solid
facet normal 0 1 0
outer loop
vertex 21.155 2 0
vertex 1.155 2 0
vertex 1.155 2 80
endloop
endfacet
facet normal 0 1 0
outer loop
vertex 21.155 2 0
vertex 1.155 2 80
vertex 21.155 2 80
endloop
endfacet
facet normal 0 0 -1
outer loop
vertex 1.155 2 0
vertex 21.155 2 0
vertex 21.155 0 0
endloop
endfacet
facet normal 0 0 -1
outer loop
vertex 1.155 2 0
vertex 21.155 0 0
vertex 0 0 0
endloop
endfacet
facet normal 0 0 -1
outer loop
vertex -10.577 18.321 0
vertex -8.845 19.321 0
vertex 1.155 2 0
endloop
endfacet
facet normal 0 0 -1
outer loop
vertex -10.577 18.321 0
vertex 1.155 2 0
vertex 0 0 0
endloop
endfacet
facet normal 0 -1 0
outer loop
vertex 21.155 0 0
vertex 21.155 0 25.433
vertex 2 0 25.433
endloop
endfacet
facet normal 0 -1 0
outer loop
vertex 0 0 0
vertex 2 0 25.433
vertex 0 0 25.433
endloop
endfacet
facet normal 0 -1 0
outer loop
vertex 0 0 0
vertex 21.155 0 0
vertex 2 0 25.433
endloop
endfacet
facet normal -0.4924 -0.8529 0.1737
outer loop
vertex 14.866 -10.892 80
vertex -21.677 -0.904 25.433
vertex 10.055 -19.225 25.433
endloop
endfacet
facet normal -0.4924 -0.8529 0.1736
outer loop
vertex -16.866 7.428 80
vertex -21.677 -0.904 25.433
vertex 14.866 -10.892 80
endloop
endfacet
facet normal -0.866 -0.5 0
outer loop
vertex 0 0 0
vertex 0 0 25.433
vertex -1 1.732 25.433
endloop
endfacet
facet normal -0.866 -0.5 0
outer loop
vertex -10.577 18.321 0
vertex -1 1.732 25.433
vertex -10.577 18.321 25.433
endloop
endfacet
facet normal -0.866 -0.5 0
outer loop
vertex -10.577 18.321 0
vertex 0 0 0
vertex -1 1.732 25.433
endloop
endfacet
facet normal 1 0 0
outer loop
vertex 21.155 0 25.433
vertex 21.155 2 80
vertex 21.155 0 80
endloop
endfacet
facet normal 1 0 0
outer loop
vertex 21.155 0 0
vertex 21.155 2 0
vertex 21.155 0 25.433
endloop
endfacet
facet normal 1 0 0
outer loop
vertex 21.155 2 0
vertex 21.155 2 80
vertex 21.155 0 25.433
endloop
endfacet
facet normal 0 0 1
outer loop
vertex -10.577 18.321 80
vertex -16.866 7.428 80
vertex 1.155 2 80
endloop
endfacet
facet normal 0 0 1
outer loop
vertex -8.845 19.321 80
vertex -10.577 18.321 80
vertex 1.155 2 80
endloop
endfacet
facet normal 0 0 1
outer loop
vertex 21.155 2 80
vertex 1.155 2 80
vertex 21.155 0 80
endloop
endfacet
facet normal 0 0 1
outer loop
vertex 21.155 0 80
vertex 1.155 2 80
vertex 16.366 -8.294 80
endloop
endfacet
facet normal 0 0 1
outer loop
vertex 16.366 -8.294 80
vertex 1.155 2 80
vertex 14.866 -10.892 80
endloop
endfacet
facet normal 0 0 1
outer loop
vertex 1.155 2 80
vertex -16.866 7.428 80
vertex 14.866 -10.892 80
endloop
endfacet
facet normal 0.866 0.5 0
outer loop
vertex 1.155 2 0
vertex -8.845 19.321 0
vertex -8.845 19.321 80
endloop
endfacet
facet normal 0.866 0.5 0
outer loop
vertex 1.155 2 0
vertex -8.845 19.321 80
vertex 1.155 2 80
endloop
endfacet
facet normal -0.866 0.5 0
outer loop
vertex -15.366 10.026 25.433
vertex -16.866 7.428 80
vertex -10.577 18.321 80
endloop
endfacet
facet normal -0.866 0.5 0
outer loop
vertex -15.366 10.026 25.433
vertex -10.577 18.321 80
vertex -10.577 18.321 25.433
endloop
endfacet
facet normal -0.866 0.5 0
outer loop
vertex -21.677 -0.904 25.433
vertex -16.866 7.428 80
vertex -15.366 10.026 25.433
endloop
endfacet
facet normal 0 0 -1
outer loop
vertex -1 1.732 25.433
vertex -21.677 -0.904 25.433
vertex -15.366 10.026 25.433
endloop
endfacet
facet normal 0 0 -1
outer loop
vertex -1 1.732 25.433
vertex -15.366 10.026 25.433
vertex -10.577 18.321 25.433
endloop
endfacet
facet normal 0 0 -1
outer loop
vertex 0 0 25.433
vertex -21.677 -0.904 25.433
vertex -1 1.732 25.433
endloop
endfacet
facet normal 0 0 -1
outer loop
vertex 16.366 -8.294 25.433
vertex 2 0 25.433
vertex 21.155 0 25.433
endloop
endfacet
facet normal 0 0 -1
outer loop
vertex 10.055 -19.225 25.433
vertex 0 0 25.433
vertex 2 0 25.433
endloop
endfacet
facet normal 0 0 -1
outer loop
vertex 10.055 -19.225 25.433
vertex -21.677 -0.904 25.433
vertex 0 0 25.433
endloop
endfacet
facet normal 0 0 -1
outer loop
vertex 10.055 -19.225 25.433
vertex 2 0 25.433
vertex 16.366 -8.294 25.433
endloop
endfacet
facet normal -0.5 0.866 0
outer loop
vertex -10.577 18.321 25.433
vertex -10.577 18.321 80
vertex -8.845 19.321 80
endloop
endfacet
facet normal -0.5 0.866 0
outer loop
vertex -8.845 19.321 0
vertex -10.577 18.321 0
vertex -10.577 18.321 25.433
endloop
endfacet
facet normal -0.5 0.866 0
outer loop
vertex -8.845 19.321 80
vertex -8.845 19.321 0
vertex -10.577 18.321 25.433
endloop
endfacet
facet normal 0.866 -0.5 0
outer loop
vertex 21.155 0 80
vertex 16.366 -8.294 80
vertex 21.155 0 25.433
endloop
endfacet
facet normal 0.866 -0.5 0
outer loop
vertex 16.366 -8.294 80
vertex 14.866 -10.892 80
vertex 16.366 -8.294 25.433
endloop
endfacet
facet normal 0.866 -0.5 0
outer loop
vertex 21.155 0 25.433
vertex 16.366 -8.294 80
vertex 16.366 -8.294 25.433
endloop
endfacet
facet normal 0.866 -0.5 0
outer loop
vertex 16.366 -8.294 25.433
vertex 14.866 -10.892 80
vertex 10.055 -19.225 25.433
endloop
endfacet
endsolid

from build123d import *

# Parameters (mm, degrees)
BOSS_EXTRUDE2_DEPTH      = 80
BOSS_EXTRUDE3_DEPTH      = 18.320508
BOSS_EXTRUDE3_DEPTH_BACK = 18.320508
BOSS_EXTRUDE4_REACH      = 87.413
SKETCH6_W                = 54.567226391
SKETCH6_H                = 16.588457268
BOSS_EXTRUDE5_REACH      = 87.413
SKETCH8_W                = 16.588457268
SKETCH8_H                = 54.567226391


with BuildPart() as part:
    # Sketch3 → Boss-Extrude2 (new body)
    with BuildSketch(Plane.XY):
        Polygon((0, 0), (-10.577350269, 18.320508076), (-8.845299462, 19.320508076), (1.154700538, 2), (21.154700538, 2), (21.154700538, 0), align=None)
    extrude(amount=BOSS_EXTRUDE2_DEPTH)

    # Sketch5 → Boss-Extrude3 (add, two sides: drawn at the far end of the back side and taken through both)
    with BuildSketch(Plane(origin=(0, 0, 0), x_dir=(0, 0, -1), z_dir=(0.86602540378444, -0.4999999999999977, 0)).offset(-BOSS_EXTRUDE3_DEPTH_BACK)):
        Polygon((-25.432773609, -9.621674275), (-25.432773609, -11.621674275), (-80, -2), (-80, 0), (-80, 1), (-25.432773609, 1), (-25.432773609, 0), align=None)
    extrude(amount=BOSS_EXTRUDE3_DEPTH + BOSS_EXTRUDE3_DEPTH_BACK)

    # Sketch6 → Boss-Extrude4 (add, up to next)
    with BuildSketch(Plane(origin=(0.4999999999999976, 0.8660254037844397, 0), x_dir=(0, 0, -1), z_dir=(0.49999999999999784, 0.8660254037844398, 0)), mode=Mode.PRIVATE) as boss_extrude4_sk1:
        with Locations((-52.716386805, 10.026279442)):
            Rectangle(SKETCH6_W, SKETCH6_H)
    boss_extrude4_tool1 = extrude(boss_extrude4_sk1.sketch, amount=BOSS_EXTRUDE4_REACH, mode=Mode.PRIVATE) - part.part
    add(boss_extrude4_tool1.solids().sort_by_distance((-8.183013, 5.879165, 52.716387))[0])

    # Sketch8 → Boss-Extrude5 (add, up to next)
    with BuildSketch(Plane(origin=(0.4999999999999976, 0.8660254037844397, 0), x_dir=(0.8660254037844399, -0.4999999999999979, 0), z_dir=(0.49999999999999784, 0.8660254037844398, 0)), mode=Mode.PRIVATE) as boss_extrude5_sk1:
        with Locations((10.026279442, -52.716386805)):
            Rectangle(SKETCH8_W, SKETCH8_H)
    boss_extrude5_tool1 = extrude(boss_extrude5_sk1.sketch, amount=BOSS_EXTRUDE5_REACH, mode=Mode.PRIVATE) - part.part
    add(boss_extrude5_tool1.solids().sort_by_distance((9.183013, -4.147114, 52.716387))[0])


solid = part.part
